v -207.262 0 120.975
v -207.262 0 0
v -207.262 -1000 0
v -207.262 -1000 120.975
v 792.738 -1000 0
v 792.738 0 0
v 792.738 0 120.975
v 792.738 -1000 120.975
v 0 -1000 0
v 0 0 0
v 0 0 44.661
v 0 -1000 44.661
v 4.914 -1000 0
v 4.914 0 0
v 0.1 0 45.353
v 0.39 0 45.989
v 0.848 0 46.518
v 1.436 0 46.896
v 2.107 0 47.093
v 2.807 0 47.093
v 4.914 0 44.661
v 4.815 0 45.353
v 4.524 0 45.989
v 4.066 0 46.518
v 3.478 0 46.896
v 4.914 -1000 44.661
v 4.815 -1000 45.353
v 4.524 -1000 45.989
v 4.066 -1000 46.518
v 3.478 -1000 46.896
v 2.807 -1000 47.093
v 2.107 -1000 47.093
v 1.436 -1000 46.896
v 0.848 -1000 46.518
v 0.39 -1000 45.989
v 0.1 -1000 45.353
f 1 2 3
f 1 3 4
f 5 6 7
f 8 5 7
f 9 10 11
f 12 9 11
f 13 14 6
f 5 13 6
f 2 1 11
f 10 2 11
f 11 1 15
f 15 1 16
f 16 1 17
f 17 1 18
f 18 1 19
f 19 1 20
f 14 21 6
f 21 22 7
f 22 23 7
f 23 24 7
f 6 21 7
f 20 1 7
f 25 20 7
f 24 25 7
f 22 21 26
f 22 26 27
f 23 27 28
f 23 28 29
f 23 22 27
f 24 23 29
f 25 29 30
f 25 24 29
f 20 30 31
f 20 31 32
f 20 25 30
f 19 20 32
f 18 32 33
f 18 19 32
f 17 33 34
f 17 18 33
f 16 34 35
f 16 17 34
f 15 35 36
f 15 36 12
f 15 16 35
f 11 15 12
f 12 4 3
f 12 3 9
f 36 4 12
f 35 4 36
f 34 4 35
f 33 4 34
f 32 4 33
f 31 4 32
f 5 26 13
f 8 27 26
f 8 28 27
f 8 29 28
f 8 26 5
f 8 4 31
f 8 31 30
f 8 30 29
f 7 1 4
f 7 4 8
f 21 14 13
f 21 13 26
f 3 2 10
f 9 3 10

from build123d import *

# Parameters (mm, degrees)
F0_W     = 1000
F0_H     = 120.975018
F2_DEPTH = 1000
F1_W     = 4.91416
F1_H     = 44.66103
F3_DEPTH = 1000


with BuildPart() as f2:
    # F0 (on Front) → F2 (new body)
    with BuildSketch(Plane.XZ):
        with Locations((292.73814, 60.487509)):
            Rectangle(F0_W, F0_H)
    extrude(amount=F2_DEPTH)

    # F1 (on Front) → F3 (cut)
    with BuildSketch(Plane.XZ):
        with Locations((2.45708, 22.330515)):
            Rectangle(F1_W, F1_H)
        with BuildLine():
            Line((0, 44.66103), (4.91416, 44.66103))
            ThreePointArc((4.91416, 44.66103), (2.45708, 47.11811), (0, 44.66103))
        make_face()
    extrude(amount=F3_DEPTH, mode=Mode.SUBTRACT)


solid = f2.part
